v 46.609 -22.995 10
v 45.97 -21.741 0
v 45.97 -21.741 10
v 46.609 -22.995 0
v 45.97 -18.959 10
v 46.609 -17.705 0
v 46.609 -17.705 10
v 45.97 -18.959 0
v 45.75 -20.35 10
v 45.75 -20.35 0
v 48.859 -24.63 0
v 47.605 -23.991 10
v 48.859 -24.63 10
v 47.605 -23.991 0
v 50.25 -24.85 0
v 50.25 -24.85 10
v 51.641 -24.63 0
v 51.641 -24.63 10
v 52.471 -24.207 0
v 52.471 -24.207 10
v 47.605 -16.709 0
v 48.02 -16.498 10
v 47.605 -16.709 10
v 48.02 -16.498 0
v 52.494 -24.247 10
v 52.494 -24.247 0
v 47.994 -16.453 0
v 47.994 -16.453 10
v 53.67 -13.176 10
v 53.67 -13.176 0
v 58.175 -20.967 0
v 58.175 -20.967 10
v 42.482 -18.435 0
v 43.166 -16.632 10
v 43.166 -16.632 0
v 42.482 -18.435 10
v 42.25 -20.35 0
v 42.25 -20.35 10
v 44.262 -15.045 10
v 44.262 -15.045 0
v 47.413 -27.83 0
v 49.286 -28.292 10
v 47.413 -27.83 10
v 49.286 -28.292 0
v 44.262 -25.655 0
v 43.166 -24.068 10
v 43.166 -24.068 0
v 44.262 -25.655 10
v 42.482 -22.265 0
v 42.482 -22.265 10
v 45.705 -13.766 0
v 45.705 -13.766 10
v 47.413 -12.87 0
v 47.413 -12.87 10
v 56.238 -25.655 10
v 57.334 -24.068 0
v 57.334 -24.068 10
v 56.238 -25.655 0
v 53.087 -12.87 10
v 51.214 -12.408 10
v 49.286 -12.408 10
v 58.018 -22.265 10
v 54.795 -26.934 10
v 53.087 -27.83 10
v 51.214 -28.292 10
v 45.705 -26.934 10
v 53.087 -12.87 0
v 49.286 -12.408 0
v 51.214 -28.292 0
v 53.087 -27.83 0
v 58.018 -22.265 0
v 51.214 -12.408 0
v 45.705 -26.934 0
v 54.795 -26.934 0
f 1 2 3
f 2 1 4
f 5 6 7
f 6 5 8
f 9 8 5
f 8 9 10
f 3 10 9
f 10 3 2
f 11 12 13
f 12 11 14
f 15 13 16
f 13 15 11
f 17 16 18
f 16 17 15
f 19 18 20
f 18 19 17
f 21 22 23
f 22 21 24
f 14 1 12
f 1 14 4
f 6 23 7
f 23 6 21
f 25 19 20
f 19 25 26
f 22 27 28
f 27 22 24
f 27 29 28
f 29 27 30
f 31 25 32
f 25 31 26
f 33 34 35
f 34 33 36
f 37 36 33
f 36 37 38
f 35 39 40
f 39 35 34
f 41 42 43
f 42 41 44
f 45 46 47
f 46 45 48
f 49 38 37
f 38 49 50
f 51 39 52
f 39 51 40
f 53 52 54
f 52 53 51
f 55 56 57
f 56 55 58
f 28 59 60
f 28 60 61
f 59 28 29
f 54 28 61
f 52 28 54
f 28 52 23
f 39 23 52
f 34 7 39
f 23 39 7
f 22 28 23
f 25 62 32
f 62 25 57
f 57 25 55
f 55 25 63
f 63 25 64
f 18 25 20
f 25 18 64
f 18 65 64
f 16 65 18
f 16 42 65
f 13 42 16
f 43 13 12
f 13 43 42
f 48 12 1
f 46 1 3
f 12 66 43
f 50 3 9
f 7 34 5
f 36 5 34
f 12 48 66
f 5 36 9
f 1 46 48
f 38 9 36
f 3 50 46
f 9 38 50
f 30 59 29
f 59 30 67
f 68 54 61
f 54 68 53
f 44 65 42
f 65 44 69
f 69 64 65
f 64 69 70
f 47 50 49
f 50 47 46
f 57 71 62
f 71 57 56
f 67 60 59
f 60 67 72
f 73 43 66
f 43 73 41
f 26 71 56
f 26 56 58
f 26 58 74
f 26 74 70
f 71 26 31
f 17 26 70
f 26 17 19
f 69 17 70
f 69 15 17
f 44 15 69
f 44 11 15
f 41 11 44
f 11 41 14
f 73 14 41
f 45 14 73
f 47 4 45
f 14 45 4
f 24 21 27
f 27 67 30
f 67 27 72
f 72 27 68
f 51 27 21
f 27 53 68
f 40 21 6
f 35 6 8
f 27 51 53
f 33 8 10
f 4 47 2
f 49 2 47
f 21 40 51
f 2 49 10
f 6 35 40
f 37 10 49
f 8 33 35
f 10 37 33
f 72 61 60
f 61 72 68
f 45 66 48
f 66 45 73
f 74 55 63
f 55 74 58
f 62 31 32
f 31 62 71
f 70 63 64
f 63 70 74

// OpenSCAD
// file: functions.scad
// PRUSA Mendel  
// Functions used in many files
// GNU GPL v3
// Josef Průša
// josefprusa@me.com
// prusadjs.cz
// http://www.reprap.org/wiki/Prusa_Mendel
// http://github.com/prusajr/PrusaMendel


module nut(d,h,horizontal=true){
cornerdiameter =  (d / 2) / cos (180 / 6);
cylinder(h = h, r = cornerdiameter, $fn = 6);
if(horizontal){
for(i = [1:6]){
	rotate([0,0,60*i]) translate([-cornerdiameter-0.2,0,0]) rotate([0,0,-45]) cube(size = [2,2,h]);
}}
}

// Based on nophead research
module polyhole(d,h) {
    n = max(round(2 * d),3);
    rotate([0,0,180])
        cylinder(h = h, r = (d / 2) / cos (180 / n), $fn = n);
}




module roundcorner(diameter){
	difference(){
		cube(size = [diameter,diameter,99], center = false);
		translate(v = [diameter, diameter, 0]) cylinder(h = 100, r=diameter, center=false,$fn = max(3*diameter,20));
	}
}

module t25_indent()
{
	union()
	{
		for(z=[-5:5])
			translate([0,-5,z*2.5])
				difference()
				{
					cube([30,10,1.25],center=true);
					translate([0, 5, 1.7])
						rotate([-45,0,0])
							cube([40,10,2],center=true);
					translate([0, 5, -1.7])
						rotate([45,0,0])
							cube([40,10,2],center=true);

				}
	}
}
// file: configuration.scad
// PRUSA Mendel  
// Configuration file
// GNU GPL v2
// Josef Pra
// josefprusa@me.com
// prusadjs.cz
// http://www.reprap.org/wiki/Prusa_Mendel
// http://github.com/prusajr/PrusaMendel


// PLEASE SELECT ONE OF THE CONFIGURATIONS BELOW
// BY UN-COMMENTING IT


variant=0; //0 for metric
//variant=1; //1 for SAE
if(variant==0){
echo("variant: metric");
}else if(variant==1){
echo("variant: sae");
} else{
echo("WARNING: INVALID CONFIGURATION");
}




vars=[
//[m8_dia,m8_nut, m4_dia, m4_nut, m3_dia, m3_nut, bush_dia, mot_shaft, bush_rod, bush_outerdia, bush_length, m5_dia, m5_nut]
[8.4, 14.8, 4.3,8.1, 3.1, 6.5, 11, 5.3, 8, 16, 11, 5.3,9.3],//metric - M3 nut was 7; M3 was 4.4
[9,15.7,5.5,10.6,5.5,10.6,11.5,5.3,7.9375,16,11,5.6, 10]//SAE
];


//BUSHING TYPE Can generate three versions
// 1 - regular old ones
// 2 - helical ones
// 3 - holders for brass or any other bought bushings
bushing_type = 2;


//Round corner diameter
round_corner_diameter = 8;


//Thin wall size
layer_height = 0.4;
perimeter_width_over_thicknes = 1.6;
infill_widht_over_thickness = 1.55;
thin_wall = 2*(perimeter_width_over_thicknes*layer_height+infill_widht_over_thickness*layer_height);
if(thin_wall<2){
	echo("Check thin wall size, its below 2mm!");
}
echo(thin_wall);


//DO NOT TOUCH THIS SECTION!
m8_diameter = vars[variant][0];
m8_nut_diameter = vars[variant][1];
m4_diameter = vars[variant][2];
m4_nut_diameter = vars[variant][3];
m3_diameter = vars[variant][4];
m3_nut_diameter = vars[variant][5];
bushing_diameter = vars[variant][6];
motor_shaft=vars[variant][7];
bushing_rodsize = vars[variant][8];
bushing_outerDiameter = vars[variant][9];
bushing_lenght = vars[variant][10];
m5_diameter = vars[variant][11];
m5_nut_diameter = vars[variant][12];



// MINI-HUXLEY VERSION (TODO, just place holder)
// include <configuration-huxley.scad>


// MEGA VERSION (TODO, just place holder)
// include <configuration-mega.scad>

// Gap between the X rods

x_rod_centres=70;
y_rod_centres=183;
belt_width=6;
belt_clamp_centres=18;
ptfe_diameter=4;
z_slot_width=3.5;

vertex_x_rod_1=[11.013,59.912];
vertex_x_rod_2=[40.274,9.249,0];
vertex_x_rod_gap=sqrt((vertex_x_rod_1.x-vertex_x_rod_2.x)*(vertex_x_rod_1.x-vertex_x_rod_2.x) +(vertex_x_rod_1.y-vertex_x_rod_2.y)*(vertex_x_rod_1.y-vertex_x_rod_2.y) );

// Some basic functions, probably should be somewhere else
module roundcorner(diameter){
	difference(){
		cube(size = [diameter,diameter,99], center = false);
		translate(v = [diameter, diameter, 0]) cylinder(h = 100, r=diameter, center=true);
	}
}

include <functions.scad>
// main file
// Print one of the objects generated when this is true, and one when it's false.
open_standoff();
//closed_standoff();

include <configuration.scad> ;


cyl_height = 10 ;

module closed_standoff(){
	difference(){
		cylinder(h=cyl_height, r=5) ;
		cylinder(h=50,r=m3_diameter/2,$fn=20) ;
		}
}




module open_standoff() {
				rotate([0,180,0])
				mirror([0,0,1])
				difference()	 {
									translate([-50.25,-20.35,0]) cylinder(h=cyl_height, r=8) ;
									union() {
										translate([-50.25,-20.35,-5]) cylinder(h=30,r=4.50,$fn=20) ;
										translate([-55.44,-17.35,10]) rotate(a=[0,0,-30]) cube(size = [12,9,30], center = true) ;
											}	

								}

} ;
